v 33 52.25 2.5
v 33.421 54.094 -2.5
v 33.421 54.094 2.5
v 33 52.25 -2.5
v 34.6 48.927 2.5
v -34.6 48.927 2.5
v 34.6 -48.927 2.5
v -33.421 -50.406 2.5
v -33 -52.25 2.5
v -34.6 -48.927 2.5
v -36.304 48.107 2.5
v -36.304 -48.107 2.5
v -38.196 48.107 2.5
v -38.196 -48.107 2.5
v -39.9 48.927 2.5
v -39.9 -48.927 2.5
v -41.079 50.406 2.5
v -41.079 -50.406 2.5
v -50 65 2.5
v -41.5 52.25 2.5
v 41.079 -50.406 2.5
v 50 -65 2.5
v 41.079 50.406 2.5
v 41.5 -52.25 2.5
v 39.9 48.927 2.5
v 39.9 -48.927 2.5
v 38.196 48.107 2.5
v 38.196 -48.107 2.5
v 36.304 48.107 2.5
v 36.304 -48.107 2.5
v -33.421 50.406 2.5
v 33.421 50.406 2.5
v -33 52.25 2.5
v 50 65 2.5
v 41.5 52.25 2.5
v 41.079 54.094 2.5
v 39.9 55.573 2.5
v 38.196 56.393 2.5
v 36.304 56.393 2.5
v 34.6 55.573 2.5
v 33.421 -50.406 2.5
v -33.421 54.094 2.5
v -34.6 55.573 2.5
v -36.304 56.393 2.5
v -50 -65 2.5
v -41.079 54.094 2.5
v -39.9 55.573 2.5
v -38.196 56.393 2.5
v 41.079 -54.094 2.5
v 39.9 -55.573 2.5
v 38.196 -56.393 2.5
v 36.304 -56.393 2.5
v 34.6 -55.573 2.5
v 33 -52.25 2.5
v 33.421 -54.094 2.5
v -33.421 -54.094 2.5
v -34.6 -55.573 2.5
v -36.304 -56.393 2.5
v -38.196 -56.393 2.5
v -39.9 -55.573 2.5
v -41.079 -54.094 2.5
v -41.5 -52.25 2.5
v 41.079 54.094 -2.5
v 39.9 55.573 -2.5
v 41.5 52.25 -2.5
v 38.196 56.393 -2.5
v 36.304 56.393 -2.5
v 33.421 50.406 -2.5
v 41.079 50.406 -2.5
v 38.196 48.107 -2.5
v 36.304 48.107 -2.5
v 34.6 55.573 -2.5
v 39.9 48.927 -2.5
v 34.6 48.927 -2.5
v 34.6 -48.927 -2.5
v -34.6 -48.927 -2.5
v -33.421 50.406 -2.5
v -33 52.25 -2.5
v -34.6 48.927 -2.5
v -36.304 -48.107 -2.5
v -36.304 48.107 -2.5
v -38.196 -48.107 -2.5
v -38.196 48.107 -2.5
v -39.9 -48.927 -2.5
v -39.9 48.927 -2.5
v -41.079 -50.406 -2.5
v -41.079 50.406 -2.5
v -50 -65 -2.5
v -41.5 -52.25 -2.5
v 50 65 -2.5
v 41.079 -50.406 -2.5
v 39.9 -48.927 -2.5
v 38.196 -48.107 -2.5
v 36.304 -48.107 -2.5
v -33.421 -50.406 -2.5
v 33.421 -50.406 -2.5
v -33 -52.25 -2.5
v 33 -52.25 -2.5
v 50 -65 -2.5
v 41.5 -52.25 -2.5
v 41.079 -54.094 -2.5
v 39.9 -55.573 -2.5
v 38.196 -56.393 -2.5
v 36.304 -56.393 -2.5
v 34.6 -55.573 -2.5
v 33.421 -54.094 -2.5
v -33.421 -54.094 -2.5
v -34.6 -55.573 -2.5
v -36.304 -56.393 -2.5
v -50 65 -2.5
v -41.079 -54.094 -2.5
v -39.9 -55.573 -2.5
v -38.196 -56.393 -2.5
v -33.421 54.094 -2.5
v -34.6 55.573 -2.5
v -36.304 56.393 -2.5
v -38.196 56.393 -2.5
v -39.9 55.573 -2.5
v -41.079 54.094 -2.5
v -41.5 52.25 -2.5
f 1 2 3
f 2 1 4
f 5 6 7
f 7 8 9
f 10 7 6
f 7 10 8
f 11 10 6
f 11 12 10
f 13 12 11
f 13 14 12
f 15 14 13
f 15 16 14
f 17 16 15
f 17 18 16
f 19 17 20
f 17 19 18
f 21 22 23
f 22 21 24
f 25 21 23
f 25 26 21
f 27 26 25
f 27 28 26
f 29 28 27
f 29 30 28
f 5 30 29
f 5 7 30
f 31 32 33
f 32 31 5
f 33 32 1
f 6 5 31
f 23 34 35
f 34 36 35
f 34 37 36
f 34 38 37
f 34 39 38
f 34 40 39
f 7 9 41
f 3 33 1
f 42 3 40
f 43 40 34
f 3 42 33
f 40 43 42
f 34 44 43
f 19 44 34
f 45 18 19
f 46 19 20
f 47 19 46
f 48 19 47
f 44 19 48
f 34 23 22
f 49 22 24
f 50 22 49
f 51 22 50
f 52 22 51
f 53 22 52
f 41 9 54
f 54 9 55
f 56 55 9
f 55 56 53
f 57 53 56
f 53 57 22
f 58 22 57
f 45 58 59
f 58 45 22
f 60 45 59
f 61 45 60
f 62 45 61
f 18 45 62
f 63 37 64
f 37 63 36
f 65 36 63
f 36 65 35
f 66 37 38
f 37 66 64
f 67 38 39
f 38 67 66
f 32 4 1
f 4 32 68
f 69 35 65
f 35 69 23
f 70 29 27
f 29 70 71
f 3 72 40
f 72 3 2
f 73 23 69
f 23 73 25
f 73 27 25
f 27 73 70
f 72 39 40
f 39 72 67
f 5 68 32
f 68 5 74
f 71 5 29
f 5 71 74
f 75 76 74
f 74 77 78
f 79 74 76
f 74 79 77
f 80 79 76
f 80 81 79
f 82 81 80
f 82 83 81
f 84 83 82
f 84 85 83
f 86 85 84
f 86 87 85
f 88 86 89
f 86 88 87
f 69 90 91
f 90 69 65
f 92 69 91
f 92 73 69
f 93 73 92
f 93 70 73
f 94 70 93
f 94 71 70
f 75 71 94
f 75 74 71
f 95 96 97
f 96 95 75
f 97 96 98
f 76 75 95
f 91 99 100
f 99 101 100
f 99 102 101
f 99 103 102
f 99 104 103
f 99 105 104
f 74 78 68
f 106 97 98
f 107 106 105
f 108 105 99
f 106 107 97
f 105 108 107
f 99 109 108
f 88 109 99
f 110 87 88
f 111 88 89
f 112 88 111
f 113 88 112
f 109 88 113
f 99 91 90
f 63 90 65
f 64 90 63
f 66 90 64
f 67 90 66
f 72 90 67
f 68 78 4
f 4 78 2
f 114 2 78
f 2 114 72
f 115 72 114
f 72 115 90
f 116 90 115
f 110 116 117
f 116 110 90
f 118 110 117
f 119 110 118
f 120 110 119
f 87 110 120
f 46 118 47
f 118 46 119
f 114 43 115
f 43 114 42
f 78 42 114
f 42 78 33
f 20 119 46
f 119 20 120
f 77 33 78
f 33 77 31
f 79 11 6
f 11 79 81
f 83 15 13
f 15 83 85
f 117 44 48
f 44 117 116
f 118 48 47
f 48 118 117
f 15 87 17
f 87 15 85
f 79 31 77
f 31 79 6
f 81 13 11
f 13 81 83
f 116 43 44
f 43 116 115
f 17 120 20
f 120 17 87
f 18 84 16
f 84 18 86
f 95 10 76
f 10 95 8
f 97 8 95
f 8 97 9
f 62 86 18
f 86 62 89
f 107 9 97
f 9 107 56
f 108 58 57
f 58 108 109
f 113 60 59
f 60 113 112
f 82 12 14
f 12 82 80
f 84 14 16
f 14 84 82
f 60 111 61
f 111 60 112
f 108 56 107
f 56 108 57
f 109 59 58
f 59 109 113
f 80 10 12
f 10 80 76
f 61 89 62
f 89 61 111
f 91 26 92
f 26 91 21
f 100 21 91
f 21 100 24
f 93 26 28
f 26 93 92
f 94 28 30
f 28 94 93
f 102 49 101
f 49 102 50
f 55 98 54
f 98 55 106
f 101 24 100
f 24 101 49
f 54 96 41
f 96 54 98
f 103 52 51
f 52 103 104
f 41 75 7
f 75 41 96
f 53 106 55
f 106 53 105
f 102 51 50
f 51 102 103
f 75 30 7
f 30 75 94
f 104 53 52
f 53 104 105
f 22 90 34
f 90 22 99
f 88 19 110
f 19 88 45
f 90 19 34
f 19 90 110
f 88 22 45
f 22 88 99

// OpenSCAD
// Generated by SolidPython 1.1.3 on 2023-10-16 12:15:28


difference() {
	cube(center = true, size = [100, 130.0000000000, 5]);
	union() {
		translate(v = [37.2500000000, 52.2500000000]) {
			cylinder(center = true, h = 5, r = 4.2500000000);
		}
		translate(v = [-37.2500000000, 52.2500000000]) {
			cylinder(center = true, h = 5, r = 4.2500000000);
		}
		translate(v = [-37.2500000000, -52.2500000000]) {
			cylinder(center = true, h = 5, r = 4.2500000000);
		}
		translate(v = [37.2500000000, -52.2500000000]) {
			cylinder(center = true, h = 5, r = 4.2500000000);
		}
	}
}
/***********************************************
*********      SolidPython code:      **********
************************************************
 
import solid
import numbers
import pudb
from solid.utils import *
import viewscad
import subprocess
import os
import os.path as osp
import math
import sys

chamfer_extrude=solid.import_scad("./chamfer_extrude.scad")
chamfer_extrude=chamfer_extrude.chamfer_extrude
r = viewscad.Renderer(width=800, height=800)

def debug(model,f_name,path="/home/ts/code/projects/mfd/designs/debug"):
    solid.scad_render_to_file(model,osp.join(path,f_name)+".scad")
#generate position list of wells using offset from center
wells_pos_from_center_4 = lambda offset: [[-offset,offset],
                                        [offset, offset],
                                        [-offset, -offset],
                                        [offset, -offset]]
#wells_pos_from_center_2 = lambda offset: [[0,offset],
#                                        [0, -offset]]
wells_pos_from_center_2 = lambda offset: [[offset,0],
                                        [-offset,0]]

def make_well(dims,shape=None,height=None,dxf=False):
    def circle_cylinder():
        if dxf or (height is None):
            well = solid.circle(r=dims, segments=64)
        else:
            well = solid.cylinder(r=dims, h=height, segments=64, center = True)
        return well
    if dims is None:
        sys.exit("radius needs to be a number")
    if isinstance(dims, numbers.Number):
        well =circle_cylinder()
    elif len(dims)==1:
        if isinstance(dims[1], numbers.Number):
            well =circle_cylinder()
        else:
            sys.exit("radius needs to be a number")
    elif len(dims)==2:
        well = solid.square(dims,center = True)
    elif len(dims)==3:
        well = solid.cube(dims, center = True)
    return well

def wells_top_bottom(center_gap,device_dims=None,shape=None,height=None, positions = None, dxf = False):
    well_shape = make_well(device_dims,shape=shape,height=height,dxf=dxf)
    wells = []
    if positions is None:
        offset = radius+radius/2.0
        positions = wells_pos_from_center_2(offset)
    if dxf or (height is None):
        height = 0
    for position in positions:
        if dxf:
            wells.append(solid.translate([position[0],position[1]])(well_shape))
        else:
            wells.append(solid.translate([position[0],position[1],height/2.0])(well_shape))
    return  union()(*wells)

#place wells in four corners 
def four_corner(radius,height=None, positions = None, dxf = False):
    #if well pos not specified set
    #to equally spaced by half radius
    if positions is None:
        offset = radius+radius/2.0
        positions = wells_pos_from_center_4(offset)
    if dxf or (height is None):
        height = 0
    #make wells at positions with specified radius and height
    wells = []
    for position in positions:
        #make circle if making dxf
        if dxf:
            well_shape = solid.circle(r=radius, segments=64)
            well_shape = solid.translate([position[0],position[1]])(well_shape)
        #if stl make cylinder
        else:
            well_shape = solid.cylinder(r=radius, h=height, segments=64, center = True)
            well_shape = solid.translate([position[0],position[1],height/2.0])(well_shape)
        wells.append(well_shape)
    return  union()(*wells)

#generate channels 
def make_channels(length,width,height=0,num_chans=1,max_chans=None,spacing=None, dxf = False,
                  rotate_channels=False):
    if dxf or (height is None):
        height = 0
    #if channel gap not defined, is equal to
    if spacing is None: spacing = width
    #calculate number of channels if fitting max num within given width
    if not max_chans is None:
        import math
        num_chans = math.floor((max_chans-spacing)/(width+spacing))
    #get total width of channel section  
    total_width = (width*num_chans)+(spacing*(num_chans-1))

    #make template channel
    #if rotate_channels: width, length = length, width
    if dxf:
        channel_t = solid.square([length,width],center = True)
    else:
        channel_t = solid.cube([length,width,height], center = True)

    #if number channels is even, offset the first channel to center its gap
    if num_chans % 2 == 0: centering = -(width/2.0+spacing/2.0)
    else: centering = 0
    #move template channel up to align bottom at z = 0 
    #and offset center if necessary
    if dxf:
        channel_t = solid.translate([0,centering])(channel_t)
    else:
        channel_t = solid.translate([0,centering,height/2.0])(channel_t)

    #if rotate_channels: length,width = width,length
    #start making the channels
    channels = []
    for i in range(num_chans):
        #if i=0 there is no translation
        #if i=1, we make the first channel adjacent to second
        direction = i

        #if i>=1, we add channels alternating left and right
        if i >= 1:
            direction = -(i/2.0)
            if i % 2 == 1: direction = (-direction)+0.5
                
        #make channel at right position and add it to channel list
        translation_coords = [0,direction*(width+spacing)]
        #if rotate_channels: translation_coords = [direction*(width+spacing),0]
        if dxf:
            channel = solid.translate(translation_coords)(channel_t)
        else:
            channel = solid.translate([*translation_coords,0])(channel_t)
        channels.append(channel)
    
    #group all channels as one object
    channels = union()(*channels)
    #compute the x,y,z dimensions in order to pass as arguments 
    #for construction of other parts of device (such as the chambers)
    measurements = {'x':(length/2.0,-length/2.0),
                    'y':(total_width/2.0,-total_width/2.0)}
    if not dxf:
        measurements['z'] = (height,0)
    if rotate_channels:
        channels = solid.rotate(90)(channels)
        measurements['x'],measurements['y']=measurements['y'],measurements['x']
    return channels,measurements

def make_chambers(msrs,height=None,extra=0,len_until=None,width=None, dxf = False):
    #computes x,y,z length
    total = lambda x : abs(x[0]) + abs(x[1])
    
    #if specific height if specified
    #otherwise use same height as channels
    if dxf:
        pass
    elif not height is None:
        msrs['z'] = (height,0)
    else:
        msrs['z'] = (0,0)
        
    #make copy of measurements from channels to modify chamber dimensions 
    #and add length to chambers as specified
    chamber_dims = msrs.copy()
    #calculate length of chamber to reach specified offset
    if not len_until is None:
        chamber_len = len_until-(msrs['x'][0])
    #or add specified length to channel length (if not specified, adds 0)
    else:
        chamber_len = msrs['x'][0]+extra
    #set the chamber length based 
    chamber_dims['x'] = (chamber_len/2.0,-(chamber_len/2.0))
    #compute final dimensions of chamber
    if not width is None:
        chamber_dims['y'] = (width/2.0,-width/2.0)
    chamber_dims = [total(size) for size in chamber_dims.values()]
        
    #calculate chamber translation offset to place adjacent to channels
    chamber_trslt = msrs['x'][0]+(chamber_len/2.0)
    #compute chamber translation coordinates to align with channels
    #x = 1 moves chamber above channels
    #x = -1 moves chamber below channels
    if dxf:
        trslt = lambda x : [x*(chamber_trslt),0]
    else:
        trslt = lambda x : [x*(chamber_trslt),0,msrs['z'][0]/2.0]
    
    #function to make chamber at top or at bottom 
    if dxf:
        move = lambda x : solid.translate(trslt(x))(solid.square(chamber_dims, center = True) )
    else:
        move = lambda x : solid.translate(trslt(x))(solid.cube(chamber_dims,center = True))
    #make top and bottom chambers and return them as grouped
    top = move(1)
    bottom = move(-1)
    #chambers=solid.rotate(90)(solid.union()(top,bottom))
    chambers=(solid.union()(top,bottom))

    return chambers

#create alignment features 
def alignment_features(unit,dims,grid_size, mask_size = None, alignment = "hollow", units_from_center = (2.5,2.5), corner_len=None):
    width = grid_size[0]*dims[0]
    length = grid_size[1]*dims[1]
    if mask_size is None and corner_len is None:
        corner_len = (dims[0] + dims[1]) /2 / 8
    corner = lambda thickness_div : solid.union()( solid.square([corner_len,corner_len/thickness_div],center=False), solid.square([corner_len/thickness_div,corner_len],center=False) )
    
    def make_full(thickness_div):
        thickness = corner_len/thickness_div
        tr = solid.translate([0, 0, 0 ])(solid.rotate(180)(corner(thickness_div)))
        tr = solid.translate([thickness/2,thickness/2,0])(tr)
        bl = solid.translate([0, 0, 0 ])(solid.rotate(0)(corner(thickness_div)))
        bl = solid.translate([-thickness/2,-thickness/2,0])(bl)
        return solid.union()(tr,bl)
    
    def make_hollow(thickness_div):
        thickness = corner_len/(thickness_div/2)
        inner = make_full(thickness_div)
        outer = make_full(thickness_div/2)
        hollow = outer - inner 
        return hollow
    
    center = (width /2 , length/2)
    mask_pos = lambda x,y : (center[0] + x*(float(units_from_center[0])*dims[0]), center[1] + y*(float(units_from_center[1])*dims[1]))
    positions = []
    positions.append(mask_pos(1,0))
    positions.append(mask_pos(0,1))
    positions.append(mask_pos(-1,0))
    positions.append(mask_pos(0,-1))
    make_mask = lambda mtype : make_hollow(8) if mtype == "hollow" else make_full(8)
    masks = [ solid.translate([*position,0])(make_mask(alignment)) for position in positions]
    
    solid.scad_render_to_file(solid.union()(*masks),"./designs/open_chamber/masks.scad")
    #return unit - solid.union()(*masks)
    return solid.union()(*masks,unit)

def create_outline(thickness, array, dims, grid_size,):
    width = grid_size[0]*dims[0] + thickness *2
    length = grid_size[1]*dims[1] + thickness *2
    outer = solid.translate([-thickness, -thickness,0])(solid.square([width, length]))
    return outer-array

def create_wall(wall_thickness, outline_thickness, dims, grid_size, wall_height = 2000, dxf = False):
    inner_width = grid_size[0]*dims[0] + outline_thickness *2
    inner_length = grid_size[1]*dims[1] + outline_thickness *2
    outer_width = inner_width + wall_thickness * 2
    outer_length = inner_length + wall_thickness * 2
    outer_pos_x = -outline_thickness-wall_thickness
    outer_pos_y = -outline_thickness-wall_thickness
    inner_pos_x = -outline_thickness
    inner_pos_y = -outline_thickness
    if dxf:
        inner_wall = solid.translate([inner_pos_x,
                                      inner_pos_y,
                                      0])(solid.square([inner_width, inner_length]))
        outer_wall = solid.translate([outer_pos_x,
                                      outer_pos_y,
                                      0])(solid.square([outer_width, outer_length]))

        return outer_wall-inner_wall
    else:
        inner_wall = solid.translate([inner_pos_x,
                                      inner_pos_y,
                                      0])(solid.cube([inner_width, inner_length,wall_height]))
        outer_wall = solid.translate([outer_pos_x,
                                      outer_pos_y,
                                      0])(solid.cube([outer_width, outer_length,wall_height]))

        return outer_wall-inner_wall, {'wall_height': wall_height,
                                       'wall_thickness': wall_thickness,
                                       'inner_width':inner_width,
                                       'inner_length': inner_length,
                                       'outer_width': outer_width,
                                       'outer_length': outer_length,
                                       'outer_pos_x' : outer_pos_x,
                                       'outer_pos_y' : outer_pos_y,
                                       'inner_pos_x' : inner_pos_x,
                                       'inner_pos_y' : inner_pos_y}

def create_thicker_wall(wall_thickness, outer_wall_offset, wall_dims, dims, grid_size, height_start = .2, height_end=2, dxf = False):
    addon_wall,thicker_wall_dims = create_wall(wall_thickness, outer_wall_offset, dims, grid_size, wall_height=height_end-height_start, dxf = False)
    addon_wall = solid.translate([0,0,height_start])(addon_wall)

    thicker_wall_dims['wall_height'] = height_end
    thicker_wall_dims['wall_thickness'] = wall_dims['wall_thickness'] + wall_thickness
    return addon_wall, thicker_wall_dims
 
def add_lock_to_wall(wall,wall_dims,y_offset = 0,cut_ratio=0.7,L_length=3, gap_ratio=0.05, axis="x",width_ratio=1/2):
    # Makes L shape
    def make_L(max_length,length_thickness,max_width,width_thickness,height,y_offset):
        length = solid.cube([max_length,length_thickness,height])
        width = solid.cube([width_thickness,max_width,height])
        width = solid.translate([max_length-(width_thickness),0,0])(width)
        L = solid.union()(width,length)
        debug(L,"L")
        if axis == "x":
            L = solid.rotate(-90)(L)
            L = solid.translate([0,max_length,0])(L)
        else:
            L = solid.rotate(-180)(L)
            L = solid.translate([max_length,max_width,0])(L)
        return solid.translate([0,0,y_offset])(L)
    
    lock_length = L_length
    lock_width = wall_dims['wall_thickness']*width_ratio
    lock_length_thickness = lock_width/2
    lock_width_thickness = lock_width/2
    L_lock = make_L(lock_length,lock_length_thickness,lock_width,lock_width_thickness, wall_dims['wall_height']-y_offset, y_offset)
    
    margin_space = lock_length - lock_length*(1-gap_ratio)
    key_length = lock_length-margin_space
    key_length_thickness = lock_length_thickness-(margin_space*2)
    key_width = lock_width-(margin_space*2)
    key_width_thickness = lock_width_thickness-(margin_space*2)
    L_key = make_L(key_length,key_length_thickness,key_width,key_width_thickness, wall_dims['wall_height']-y_offset, y_offset)
    L_key = solid.translate([margin_space,margin_space,0])(L_key)
    L = solid.union()(L_lock,L_key)
    debug(L,"L")
    
    #Make cube to be used as negative to split frame in a half
    #Can choose if making left or right negative, specify ratio of split
    def make_negative(right,cut_ratio):
        if axis == "x":
            if right:
                length = wall_dims['outer_length']*(1-cut_ratio)
                pos_x = wall_dims['outer_pos_x']+(wall_dims['outer_length']*cut_ratio)
            else:
                length = wall_dims['outer_length']*(cut_ratio)
                pos_x = wall_dims['outer_pos_x'] 
            negative = solid.cube([wall_dims['outer_width'],length, wall_dims['wall_height']])
            negative = solid.translate([wall_dims['outer_pos_y'],pos_x,0])(negative)
        else:
            if right:
                length = wall_dims['outer_width']*(1-cut_ratio)
                pos_x = wall_dims['outer_pos_y']+(wall_dims['outer_width']*cut_ratio)
            else:
                length = wall_dims['outer_width']*(cut_ratio)
                pos_x = wall_dims['outer_pos_y'] 
            negative = solid.cube([length,wall_dims['outer_length'], wall_dims['wall_height']])
            negative = solid.translate([pos_x,wall_dims['outer_pos_x'],0])(negative)
        return negative, pos_x, length 
                      
    #Make negatives
    negative_right, right_half_pos_x, right_half_length = make_negative(True,cut_ratio)
    negative_left, left_half_pos_x, right_half_length = make_negative(False,cut_ratio)
    #Make halves
    left_half = solid.difference()(wall,negative_right)
    right_half = solid.difference()(wall,negative_left)
    def place_L(L, L_length,L_width):
        #Place L on top wall       
        offset_to_center = (wall_dims['wall_thickness']-L_width)/2
        if axis == "x":
            y_pos_top = (wall_dims['outer_pos_y'] +
                    wall_dims['outer_width'] - 
                    L_width - offset_to_center)
            top_L = solid.translate([y_pos_top,
                                     right_half_pos_x-(L_length),
                                     0])(L)
            #Place L on bottom wall       
            y_pos_bottom = wall_dims['outer_pos_y']+offset_to_center
            bottom_L = solid.translate([y_pos_bottom,
                                        right_half_pos_x-L_length,
                                        0])(L)
        else:
            y_pos_top = (wall_dims['outer_pos_x'] +
                    wall_dims['outer_length'] -
                    (L_width+offset_to_center))
            top_L = solid.translate([right_half_pos_x-L_length,
                                     y_pos_top,
                                     0])(L)
            #Place L on bottom wall       
            y_pos_bottom = wall_dims['outer_pos_y']+offset_to_center
            bottom_L = solid.translate([right_half_pos_x-L_length,
                                        y_pos_bottom,
                                        0])(L)
        return bottom_L, top_L
    #Make complimentary L pieces through union and differences
    #Make Lock
    bottom_L_lock, top_L_lock = place_L(L_lock,L_length,lock_width)
    left_half = solid.difference()(left_half,bottom_L_lock)
    left_half = solid.difference()(left_half,top_L_lock)
    #Make Key
    bottom_L_key, top_L_key = place_L(L_key,L_length,lock_width)
    right_half = solid.union()(right_half,bottom_L_key)
    right_half = solid.union()(right_half,top_L_key)
    return left_half, right_half


#build a row x col grid of containment units
def make_unit_array(unit,dims,grid_size, dxf = False, alignment = None, mask_size = None,
                    units_from_center = None,alignment_offset=None, alignment_mark_size=1):
    units = []
    for col in range(grid_size[1]):
        for row in range(grid_size[0]):
            if dxf:
                units.append(solid.translate([row*dims[0],col*dims[1]])(unit))
            else:
                units.append(solid.translate([row*dims[0],col*dims[1],dims[2]/2.0])(unit))
    array = solid.union()(*units)
    if (not alignment is None) and dxf:
        if not alignment_offset is None:
            array = solid.translate([alignment_offset[0],alignment_offset[1]])(array)
        array = alignment_features(array,dims, grid_size, alignment = alignment, mask_size = None, units_from_center = units_from_center,corner_len=alignment_mark_size)
        if not alignment_offset is None:
            array = solid.translate([-alignment_offset[0],-alignment_offset[1]])(array)
    return array


def make_taylor(wells_pos = wells_pos_from_center_4(2.25), well_rad = 1.5 ,
                well_height = 2, chan_w = 0.01, chan_l = 1, chan_h = 0.010 ,
                chan_gap = 0.040, max_chans = None,num_chans=100, chamber_height  = 0.100,
                columns = 1, rows = 1, chamber_len_until=2.25, add_channels = True, add_wells = True, 
                add_chambers = True, save_path = "./", alignment = None, units_from_center = 2,
                mask_size = None, render_stl = False, outline_thickness = 0.050, dxf = True,
                wall_height = 15, wall_thickness = 0.95, casing_x=9, casing_y=9, casing_z=0,rotate_units=0):

    dims = [casing_x, casing_y, casing_z]
    wells = four_corner(well_rad,well_height, dxf = dxf, positions = wells_pos)
    debug(wells,"wells")
    channels, msrs = make_channels(chan_l,chan_w,chan_h,dxf=dxf, spacing = chan_gap, max_chans=max_chans,num_chans=num_chans)
    debug(channels,"channels")
    chambers = make_chambers(msrs,dxf = dxf, height=chamber_height,len_until=chamber_len_until)
    debug(chambers,"chambers")

    #add together and render
    device_parts = []
    if add_channels:
        device_parts.append(channels)
    if add_wells:
        device_parts.append(wells)
    if add_chambers:
        device_parts.append(chambers)
    device=union()(*device_parts)
    device = rotate(rotate_units)(device)

    device=solid.translate([dims[0]/2.0,dims[1]/2.0,0])(device)
    channels = rotate(rotate_units)(channels)
    channels=solid.translate([dims[0]/2,dims[1]/2,0])(channels)
    chambers_wells = union()(wells,chambers)
    chambers_wells = rotate(rotate_units)(chambers_wells)
    chambers_wells=solid.translate([dims[0]/2,dims[1]/2,0])(chambers_wells)

    file_name = str(rows)+'x'+str(columns)+'_units_'
    grid_size = [rows,columns]

    if alignment:
        alignment="full"
    device = make_unit_array(device,dims,grid_size, dxf=dxf, alignment = alignment,
                                 units_from_center = units_from_center)
    channels = make_unit_array(channels,dims,grid_size, dxf=dxf, alignment = alignment,
                                 units_from_center = units_from_center)
    if alignment=="full":
        alignment="hollow"

    chambers_wells = make_unit_array(chambers_wells,dims,grid_size, dxf=dxf, alignment = alignment,
                                 units_from_center =units_from_center)

    def save_model(model,prefix):
        model_fname = os.path.abspath(save_path+prefix+"_"+file_name+".scad")
        solid.scad_render_to_file(model,model_fname)
        return model_fname

    wells_fname = save_model(wells,"wells")
    channels_fname = save_model(channels,"channels")
    device_fname = save_model(device,"device")
    chambers_wells_fname = save_model(chambers_wells,"chambers_wells")
    return (chambers_wells,chambers_wells_fname), (channels,channels_fname), (device,device_fname)

def make_device(design='open',rows=8,columns=6,wells_pos = 4.5,well_offset=3.2, well_rad=3.2,well_height=0.1,
                chan_l=1,chan_w=0.01,chan_h=0.01,chan_gap=0.015,num_chans=101,dxf=True,save_path="./designs/open_chamber/",
                casing_x=9.0,casing_y=18.0,casing_z=0,rotate_units=90,units_from_center=(3,1),chamber_len_until=4.5,
                chamber_width=None,alignment=True, add_wells=True, add_channels=True,add_chambers=True):

    dims = [casing_x, casing_y, casing_z]
    if design == "open":
        wells_pos=wells_pos_from_center_2(wells_pos)
        wells = wells_top_bottom(well_offset*2,device_dims=well_rad,height=well_height, dxf = dxf, positions = wells_pos)
    elif design == "closed":
        wells_pos=wells_pos_from_center_4(wells_pos)
        debug(wells,"wells")
        wells = four_corner(well_offset,well_heightdevice_dims=well_rad, dxf = dxf, positions = wells_pos)
    else:
        print(design+" is not a valid design.\n Choose valid design: 'open' or 'closed'")
        exit()
    wells = rotate(rotate_units)(wells)
    wells=solid.translate([dims[0]/2,dims[1]/2,0])(wells)
    debug(wells,"wells")

    channels, msrs = make_channels(chan_l,chan_w,chan_h,dxf=dxf, spacing = chan_gap, num_chans=num_chans,rotate_channels=False)
    channels = rotate(rotate_units)(channels)
    channels=solid.translate([dims[0]/2,dims[1]/2,0])(channels)

    chambers=make_chambers(msrs,height=None,extra=0,len_until=chamber_len_until, width=chamber_width,dxf = dxf)
    chambers = rotate(rotate_units)(chambers)
    chambers=solid.translate([dims[0]/2,dims[1]/2,0])(chambers)

    device_parts = []
    if add_channels:
        device_parts.append(channels)
    if add_wells:
        device_parts.append(wells)
    if add_chambers:
        device_parts.append(chambers)
    device = union()(*device_parts)
    #device = rotate(rotate_units)(device)
    #device=solid.translate([dims[0]/2.0,dims[1]/2.0,0])(device)

    chambers_wells = []
    if add_chambers:
        chambers_wells.append(chambers)
    if add_wells:
        chambers_wells.append(wells)
    chambers_wells = union()(*chambers_wells)
    #chambers_wells = union()(wells,chambers)
    #chambers_wells = rotate(rotate_units)(chambers_wells)
    #chambers_wells=solid.translate([dims[0]/2,dims[1]/2,0])(chambers_wells)

    file_name = str(rows)+'x'+str(columns)+'_units_'

    grid_size = [rows,columns]
    if alignment:
        alignment="full"
    device = make_unit_array(device,dims,grid_size, dxf=dxf, alignment = alignment,
                                 units_from_center = units_from_center)
    channels = make_unit_array(channels,dims,grid_size, dxf=dxf, alignment = alignment,
                                 units_from_center = units_from_center)
    if alignment=="full":
        alignment="hollow"

    chambers_wells = make_unit_array(chambers_wells,dims,grid_size, dxf=dxf, alignment = alignment,
                                 units_from_center =units_from_center)

    def save_model(model,prefix):
        model_fname = os.path.abspath(save_path+prefix+"_"+file_name+".scad")
        solid.scad_render_to_file(model,model_fname)
        return model_fname

    wells_fname = save_model(wells,"wells")
    channels_fname = save_model(channels,"channels")
    device_fname = save_model(device,"device")
    chambers_wells_fname = save_model(chambers_wells,"chambers_wells")
    return (chambers_wells,chambers_wells_fname), (channels,channels_fname), (device,device_fname)


def make_open_chamber(rows=8,columns=6,wells_pos = wells_pos_from_center_2(4.5), well_rad=3.2,well_height=0.1,
                      chan_l=1,chan_w=0.01,chan_h=0.01,chan_gap=0.015,num_chans=101,dxf=True,save_path="./designs/open_chamber/",
                      casing_x=9.0,casing_y=18.0,casing_z=0,rotate_units=90,units_from_center=(3,1),chamber_len_until=4.5,
                      chamber_width=None,alignment=True, add_wells=True, add_channels=True,add_chambers=True):

    dims = [casing_x, casing_y, casing_z]
    wells = wells_top_bottom(well_rad,height=well_height, dxf = dxf, positions = wells_pos)
    channels, msrs = make_channels(chan_l,chan_w,chan_h,dxf=dxf, spacing = chan_gap, num_chans=num_chans,rotate_channels=False)
    chambers=make_chambers(msrs,height=None,extra=0,len_until=chamber_len_until, width=chamber_width,dxf = dxf)
    debug(chambers,"chambers")
    device_parts = []
    if add_channels:
        device_parts.append(channels)
    if add_wells:
        device_parts.append(wells)
    if add_chambers:
        device_parts.append(chambers)
    device = union()(*device_parts)
    device = rotate(rotate_units)(device)
    device=solid.translate([dims[0]/2.0,dims[1]/2.0,0])(device)
    channels = rotate(rotate_units)(channels)
    channels=solid.translate([dims[0]/2,dims[1]/2,0])(channels)
    chambers_wells = union()(wells,chambers)
    chambers_wells = rotate(rotate_units)(chambers_wells)
    chambers_wells=solid.translate([dims[0]/2,dims[1]/2,0])(chambers_wells)

    file_name = str(rows)+'x'+str(columns)+'_units_'

    grid_size = [rows,columns]
    if alignment:
        alignment="full"
    device = make_unit_array(device,dims,grid_size, dxf=dxf, alignment = alignment,
                                 units_from_center = units_from_center)
    channels = make_unit_array(channels,dims,grid_size, dxf=dxf, alignment = alignment,
                                 units_from_center = units_from_center)
    if alignment=="full":
        alignment="hollow"

    chambers_wells = make_unit_array(chambers_wells,dims,grid_size, dxf=dxf, alignment = alignment,
                                 units_from_center =units_from_center)

    def save_model(model,prefix):
        model_fname = os.path.abspath(save_path+prefix+"_"+file_name+".scad")
        solid.scad_render_to_file(model,model_fname)
        return model_fname

    wells_fname = save_model(wells,"wells")
    channels_fname = save_model(channels,"channels")
    device_fname = save_model(device,"device")
    chambers_wells_fname = save_model(chambers_wells,"chambers_wells")
    return (chambers_wells,chambers_wells_fname), (channels,channels_fname), (device,device_fname)

def to_dxf(scad_path):
    dxf_path = scad_path.replace(".scad",".dxf")
    subprocess.call(["openscad", "-o", dxf_path, scad_path])
    import ezdxf
    temp_dxf = ezdxf.readfile(dxf_path)
    temp_dxf.saveas(dxf_path)

#def make_walls(diameter,thickness,grid_size,dims,height=20,segments=256,make_inner=True):
#    wafer_wall_out = solid.cylinder(r=diameter/2,h=height, segments=segments)
#    wafer_wall_in = solid.cylinder(r=(diameter/2-thickness),h=height, segments=segments)
#    wafer_wall = solid.difference()(wafer_wall_out,wafer_wall_in)
#    wafer_wall = solid.translate([grid_size[1]*dims[1]/2.0,grid_size[0]*dims[0]/2.0])(wafer_wall)
#
#    vertical_wall_length = grid_size[1]*dims[1]
#    horizontal_wall_length = grid_size[0]*dims[0]
#    vertical_wall = solid.cube([vertical_wall_length,thickness,height],center = True)
#    vertical_wall = solid.translate([vertical_wall_length/2,0,height/2])(vertical_wall)
#    horizontal_wall = solid.cube([thickness,horizontal_wall_length,height],center = True)
#    horizontal_wall = solid.translate([0,vertical_wall_length/2,height/2])(horizontal_wall)
#    walls = []
#    walls.append(horizontal_wall)
#    walls.append(vertical_wall)
#    for col in range(grid_size[1]):
#        if col == grid_size[1]-1: 
#            walls.append(solid.translate([0,(col+1)*dims[1]])(vertical_wall))
#        elif col > 0 and col < grid_size[1]-1 and make_inner==True:
#            walls.append(solid.translate([0,(col+1)*dims[1]])(vertical_wall))
#    for row in range(grid_size[0]):
#        if row == grid_size[0]-1: 
#            walls.append(solid.translate([(row+1)*dims[0],0])(horizontal_wall))
#        elif row > 0 and row < grid_size[0]-1 and make_inner==True:
#            walls.append(solid.translate([(row+1)*dims[0],0])(horizontal_wall))
#    walls = union()(*walls)
#    wafer_walls = union()(walls,wafer_wall)
#    return walls,wafer_wall,wafer_walls

def make_walls(diameter,thickness,grid_size,dims,height=20,segments=256,make_inner=True,padx=0,pady=0):
    wafer_wall_out = solid.cylinder(r=diameter/2,h=height, segments=segments)
    wafer_wall_in = solid.cylinder(r=(diameter/2-thickness),h=height, segments=segments)
    wafer_wall = solid.difference()(wafer_wall_out,wafer_wall_in)
    wafer_wall = solid.translate([grid_size[1]*dims[1]/2.0,grid_size[0]*dims[0]/2.0])(wafer_wall)

    vertical_wall_length = grid_size[0]*dims[0]+padx
    horizontal_wall_length = grid_size[1]*dims[1]+pady
    vertical_wall = solid.cube([vertical_wall_length,thickness,height],center = True)
    vertical_wall = solid.translate([vertical_wall_length/2-pady/2,-padx/2,height/2])(vertical_wall)
    horizontal_wall = solid.cube([thickness,horizontal_wall_length,height],center = True)
    horizontal_wall = solid.translate([-pady/2,horizontal_wall_length/2-padx/2,height/2])(horizontal_wall)
    walls = []
    walls.append(horizontal_wall)
    walls.append(vertical_wall)
    for col in range(grid_size[1]):
        if col == grid_size[1]-1: 
            walls.append(solid.translate([0,(col+1)*dims[1]+pady])(vertical_wall))
        elif col > 0 and col < grid_size[1]-1 and make_inner==True:
            walls.append(solid.translate([0,(col+1)*dims[1]])(vertical_wall))
    for row in range(grid_size[0]):
        if row == grid_size[0]-1: 
            walls.append(solid.translate([(row+1)*dims[0]+padx,0])(horizontal_wall))
        elif row > 0 and row < grid_size[0]-1 and make_inner==True:
            walls.append(solid.translate([(row+1)*dims[0],0])(horizontal_wall))
    walls = union()(*walls)
    wafer_walls = union()(walls,wafer_wall)
    return walls,wafer_wall,wafer_walls

def save_model(model,base_path,base_name,dxf=True):
    if not os.path.exists(base_path):
        os.makedirs(base_path)
    dxf_path=osp.join(base_path,base_name+".scad")
    solid.scad_render_to_file(model,osp.join(dxf_path))
    if dxf:
        to_dxf(dxf_path)

def make_wafer(diameter,flat_len,thickness):
    wafer = solid.cylinder(r1=diameter/2,r2=diameter/2,h=thickness,segments=512,)()
    x_start_flat=(flat_len/2)
    y_start_flat = math.sqrt(((diameter/2)**2) - (x_start_flat**2) )
    height_delete_flat=diameter/2-y_start_flat
    flat_delete = solid.cube([flat_len,height_delete_flat,thickness],center=False)()
    flat_delete = solid.translate([-flat_len/2,y_start_flat,0])(flat_delete)
    wafer = solid.difference()(wafer,flat_delete)
    wafer = solid.rotate(90)(wafer)
    return wafer

def add_wafer_to_mask(wafer_size,flat_len,mask,grid_size,dims,wafer_line_thickness=0.1,outer_mask_thickness=5,alignment_offset=None):
    def make_wafer_mask(wafer_size,flat_len):
        wafer_mask = make_wafer(wafer_size,flat_len,1)
        wafer_mask = solid.projection()(wafer_mask)
        wafer_mask = solid.translate([grid_size[0]*dims[0]/2.0,grid_size[1]*dims[1]/2.0])(wafer_mask)
        if not alignment_offset is None:
            wafer_mask = solid.translate([-alignment_offset[0],-alignment_offset[1]])(wafer_mask)
        return wafer_mask

    inner_wafer_line_mask = make_wafer_mask(wafer_size-wafer_line_thickness/2,flat_len)
    outer_wafer_line_mask = make_wafer_mask(wafer_size+wafer_line_thickness/2,flat_len)
    outer_wafer_mask = make_wafer_mask(wafer_size+outer_mask_thickness,flat_len)
    outer_wafer_mask = solid.difference()(outer_wafer_mask,outer_wafer_line_mask)
    wafer_mask = solid.union()(outer_wafer_mask,inner_wafer_line_mask)

    return solid.difference()(wafer_mask,mask)

def make_posts(post_shape,post_height):
    posts = solid.linear_extrude(height=post_height)(post_shape)
    return posts

def make_wafer_empty(diameter,flat_len,thickness,margin,notch_len=20,notch_height=5,oversize=1.01):
    diameter*=oversize
    flat_len*=oversize
    wafer = make_wafer(diameter,flat_len,thickness)
    holder = solid.cylinder(r1=diameter/2+margin,r2=diameter/2+margin,h=thickness,segments=512)()
    holder = solid.difference()(holder,wafer)

    x_start_flat=(flat_len/2)
    y_start_flat = math.sqrt(((diameter/2)**2) - (x_start_flat**2) )
    height_delete_flat=diameter/2-y_start_flat
    notch = solid.cube([notch_len,notch_height,thickness],center=False)()
    notch = solid.translate([-notch_len/2,y_start_flat,0])(notch)
    notch = solid.rotate(90)(notch)
    return solid.difference()(holder,notch)

def wafer_print_calibration(diameter,thickness,height,z_offset):
    circles = []
    radii = []
    radii.append(diameter/2.0*0.8)
    radii.append(diameter/2.0*0.6)
    radii.append(diameter/2.0*0.4)
    radii.append(diameter/2.0*0.2)
    for radius in radii:
        inner = solid.cylinder(r1=radius-(thickness/2.0),r2=radius-(thickness/2.0),h=thickness,segments=512,)()
        outer = solid.cylinder(r1=radius+(thickness/2.0),r2=radius+(thickness/2.0),h=thickness,segments=512,)()
        diff = solid.difference()(outer,inner)
        circles.append(diff)
    circles = solid.union()(*circles)
    circles = solid.translate([0,0,z_offset])(circles)
    return circles

def make_rack(wells,dims,grid_size,alignment_offset,rack_x,rack_y,rack_thickness,bolt_width,add_bolts=True):

    #get X and Y dimensions of gride of pipette tips
    X_len = dims[0]*grid_size[0]
    Y_len = dims[1]*grid_size[1]
    #make rack
    rack = solid.cube([rack_x,rack_y,rack_thickness],center=True)

    if add_bolts:
    #add bolt holes
        bolt_hole=solid.cylinder(r=bolt_width/2,h=rack_thickness,center=True)()
        bolt_holes = []
        bolt_holes.append(solid.translate([rack_x/2-1.5*bolt_width,rack_y/2-1.5*bolt_width])(bolt_hole))
        bolt_holes.append(solid.translate([-rack_x/2+1.5*bolt_width,rack_y/2-1.5*bolt_width])(bolt_hole))
        bolt_holes.append(solid.translate([-rack_x/2+1.5*bolt_width,-rack_y/2+1.5*bolt_width])(bolt_hole))
        bolt_holes.append(solid.translate([rack_x/2-1.5*bolt_width,-rack_y/2+1.5*bolt_width])(bolt_hole))
        bolt_holes = solid.union()(*bolt_holes)
        rack=solid.difference()(rack,bolt_holes)
    rack_support = rack

    #center rack with pipette holes
    rack = solid.translate([0,0,rack_thickness/2])(rack)
    rack = solid.translate([X_len/2,Y_len/2])(rack)
    rack = solid.translate([-alignment_offset[0],-alignment_offset[1]])(rack)
    wells = solid.linear_extrude(height=rack_thickness)(wells)
    rack = solid.difference()(rack,wells)
    return rack, rack_support

def make_pillar(wells,dims,grid_size,alignment_offset,rack_x,rack_y,pillar_height,rack_thickness,bolt_width,add_bolts=True,taper_angle=1,bolt_position_corner=1.5):

    #get X and Y dimensions of gride of pipette tips
    X_len = dims[0]*grid_size[0]
    Y_len = dims[1]*grid_size[1]
    #make rack
    rack = solid.cube([rack_x,rack_y,rack_thickness],center=True)
    
    if add_bolts:
    #add bolt holes
        bolt_hole=solid.cylinder(r=bolt_width/2,h=rack_thickness,center=True)()
        bolt_holes = []
        bolt_holes.append(solid.translate([rack_x/2-bolt_position_corner*bolt_width,rack_y/2-bolt_position_corner*bolt_width])(bolt_hole))
        bolt_holes.append(solid.translate([-rack_x/2+bolt_position_corner*bolt_width,rack_y/2-bolt_position_corner*bolt_width])(bolt_hole))
        bolt_holes.append(solid.translate([-rack_x/2+bolt_position_corner*bolt_width,-rack_y/2+bolt_position_corner*bolt_width])(bolt_hole))
        bolt_holes.append(solid.translate([rack_x/2-bolt_position_corner*bolt_width,-rack_y/2+bolt_position_corner*bolt_width])(bolt_hole))
        bolt_holes = solid.union()(*bolt_holes)
        rack=solid.difference()(rack,bolt_holes)
    rack_support = rack

    #center rack with pipette holes
    #rack = solid.translate([0,0,-rack_thickness])(rack)
    rack = solid.translate([X_len/2,Y_len/2])(rack)
    rack = solid.translate([-alignment_offset[0],-alignment_offset[1]])(rack)
    if not taper_angle == 0:
        wells=chamfer_extrude(pillar_height,taper_angle,segments=20)(wells)
    else:
        wells = solid.linear_extrude(height=pillar_height)(wells)
    rack = solid.union()(rack,wells)
    return rack, rack_support

def deg_taper_len(height,deg):
    if not deg == 0:
        return height*math.tan(math.radians(deg))
    else:
        return 0









 
 
************************************************/
